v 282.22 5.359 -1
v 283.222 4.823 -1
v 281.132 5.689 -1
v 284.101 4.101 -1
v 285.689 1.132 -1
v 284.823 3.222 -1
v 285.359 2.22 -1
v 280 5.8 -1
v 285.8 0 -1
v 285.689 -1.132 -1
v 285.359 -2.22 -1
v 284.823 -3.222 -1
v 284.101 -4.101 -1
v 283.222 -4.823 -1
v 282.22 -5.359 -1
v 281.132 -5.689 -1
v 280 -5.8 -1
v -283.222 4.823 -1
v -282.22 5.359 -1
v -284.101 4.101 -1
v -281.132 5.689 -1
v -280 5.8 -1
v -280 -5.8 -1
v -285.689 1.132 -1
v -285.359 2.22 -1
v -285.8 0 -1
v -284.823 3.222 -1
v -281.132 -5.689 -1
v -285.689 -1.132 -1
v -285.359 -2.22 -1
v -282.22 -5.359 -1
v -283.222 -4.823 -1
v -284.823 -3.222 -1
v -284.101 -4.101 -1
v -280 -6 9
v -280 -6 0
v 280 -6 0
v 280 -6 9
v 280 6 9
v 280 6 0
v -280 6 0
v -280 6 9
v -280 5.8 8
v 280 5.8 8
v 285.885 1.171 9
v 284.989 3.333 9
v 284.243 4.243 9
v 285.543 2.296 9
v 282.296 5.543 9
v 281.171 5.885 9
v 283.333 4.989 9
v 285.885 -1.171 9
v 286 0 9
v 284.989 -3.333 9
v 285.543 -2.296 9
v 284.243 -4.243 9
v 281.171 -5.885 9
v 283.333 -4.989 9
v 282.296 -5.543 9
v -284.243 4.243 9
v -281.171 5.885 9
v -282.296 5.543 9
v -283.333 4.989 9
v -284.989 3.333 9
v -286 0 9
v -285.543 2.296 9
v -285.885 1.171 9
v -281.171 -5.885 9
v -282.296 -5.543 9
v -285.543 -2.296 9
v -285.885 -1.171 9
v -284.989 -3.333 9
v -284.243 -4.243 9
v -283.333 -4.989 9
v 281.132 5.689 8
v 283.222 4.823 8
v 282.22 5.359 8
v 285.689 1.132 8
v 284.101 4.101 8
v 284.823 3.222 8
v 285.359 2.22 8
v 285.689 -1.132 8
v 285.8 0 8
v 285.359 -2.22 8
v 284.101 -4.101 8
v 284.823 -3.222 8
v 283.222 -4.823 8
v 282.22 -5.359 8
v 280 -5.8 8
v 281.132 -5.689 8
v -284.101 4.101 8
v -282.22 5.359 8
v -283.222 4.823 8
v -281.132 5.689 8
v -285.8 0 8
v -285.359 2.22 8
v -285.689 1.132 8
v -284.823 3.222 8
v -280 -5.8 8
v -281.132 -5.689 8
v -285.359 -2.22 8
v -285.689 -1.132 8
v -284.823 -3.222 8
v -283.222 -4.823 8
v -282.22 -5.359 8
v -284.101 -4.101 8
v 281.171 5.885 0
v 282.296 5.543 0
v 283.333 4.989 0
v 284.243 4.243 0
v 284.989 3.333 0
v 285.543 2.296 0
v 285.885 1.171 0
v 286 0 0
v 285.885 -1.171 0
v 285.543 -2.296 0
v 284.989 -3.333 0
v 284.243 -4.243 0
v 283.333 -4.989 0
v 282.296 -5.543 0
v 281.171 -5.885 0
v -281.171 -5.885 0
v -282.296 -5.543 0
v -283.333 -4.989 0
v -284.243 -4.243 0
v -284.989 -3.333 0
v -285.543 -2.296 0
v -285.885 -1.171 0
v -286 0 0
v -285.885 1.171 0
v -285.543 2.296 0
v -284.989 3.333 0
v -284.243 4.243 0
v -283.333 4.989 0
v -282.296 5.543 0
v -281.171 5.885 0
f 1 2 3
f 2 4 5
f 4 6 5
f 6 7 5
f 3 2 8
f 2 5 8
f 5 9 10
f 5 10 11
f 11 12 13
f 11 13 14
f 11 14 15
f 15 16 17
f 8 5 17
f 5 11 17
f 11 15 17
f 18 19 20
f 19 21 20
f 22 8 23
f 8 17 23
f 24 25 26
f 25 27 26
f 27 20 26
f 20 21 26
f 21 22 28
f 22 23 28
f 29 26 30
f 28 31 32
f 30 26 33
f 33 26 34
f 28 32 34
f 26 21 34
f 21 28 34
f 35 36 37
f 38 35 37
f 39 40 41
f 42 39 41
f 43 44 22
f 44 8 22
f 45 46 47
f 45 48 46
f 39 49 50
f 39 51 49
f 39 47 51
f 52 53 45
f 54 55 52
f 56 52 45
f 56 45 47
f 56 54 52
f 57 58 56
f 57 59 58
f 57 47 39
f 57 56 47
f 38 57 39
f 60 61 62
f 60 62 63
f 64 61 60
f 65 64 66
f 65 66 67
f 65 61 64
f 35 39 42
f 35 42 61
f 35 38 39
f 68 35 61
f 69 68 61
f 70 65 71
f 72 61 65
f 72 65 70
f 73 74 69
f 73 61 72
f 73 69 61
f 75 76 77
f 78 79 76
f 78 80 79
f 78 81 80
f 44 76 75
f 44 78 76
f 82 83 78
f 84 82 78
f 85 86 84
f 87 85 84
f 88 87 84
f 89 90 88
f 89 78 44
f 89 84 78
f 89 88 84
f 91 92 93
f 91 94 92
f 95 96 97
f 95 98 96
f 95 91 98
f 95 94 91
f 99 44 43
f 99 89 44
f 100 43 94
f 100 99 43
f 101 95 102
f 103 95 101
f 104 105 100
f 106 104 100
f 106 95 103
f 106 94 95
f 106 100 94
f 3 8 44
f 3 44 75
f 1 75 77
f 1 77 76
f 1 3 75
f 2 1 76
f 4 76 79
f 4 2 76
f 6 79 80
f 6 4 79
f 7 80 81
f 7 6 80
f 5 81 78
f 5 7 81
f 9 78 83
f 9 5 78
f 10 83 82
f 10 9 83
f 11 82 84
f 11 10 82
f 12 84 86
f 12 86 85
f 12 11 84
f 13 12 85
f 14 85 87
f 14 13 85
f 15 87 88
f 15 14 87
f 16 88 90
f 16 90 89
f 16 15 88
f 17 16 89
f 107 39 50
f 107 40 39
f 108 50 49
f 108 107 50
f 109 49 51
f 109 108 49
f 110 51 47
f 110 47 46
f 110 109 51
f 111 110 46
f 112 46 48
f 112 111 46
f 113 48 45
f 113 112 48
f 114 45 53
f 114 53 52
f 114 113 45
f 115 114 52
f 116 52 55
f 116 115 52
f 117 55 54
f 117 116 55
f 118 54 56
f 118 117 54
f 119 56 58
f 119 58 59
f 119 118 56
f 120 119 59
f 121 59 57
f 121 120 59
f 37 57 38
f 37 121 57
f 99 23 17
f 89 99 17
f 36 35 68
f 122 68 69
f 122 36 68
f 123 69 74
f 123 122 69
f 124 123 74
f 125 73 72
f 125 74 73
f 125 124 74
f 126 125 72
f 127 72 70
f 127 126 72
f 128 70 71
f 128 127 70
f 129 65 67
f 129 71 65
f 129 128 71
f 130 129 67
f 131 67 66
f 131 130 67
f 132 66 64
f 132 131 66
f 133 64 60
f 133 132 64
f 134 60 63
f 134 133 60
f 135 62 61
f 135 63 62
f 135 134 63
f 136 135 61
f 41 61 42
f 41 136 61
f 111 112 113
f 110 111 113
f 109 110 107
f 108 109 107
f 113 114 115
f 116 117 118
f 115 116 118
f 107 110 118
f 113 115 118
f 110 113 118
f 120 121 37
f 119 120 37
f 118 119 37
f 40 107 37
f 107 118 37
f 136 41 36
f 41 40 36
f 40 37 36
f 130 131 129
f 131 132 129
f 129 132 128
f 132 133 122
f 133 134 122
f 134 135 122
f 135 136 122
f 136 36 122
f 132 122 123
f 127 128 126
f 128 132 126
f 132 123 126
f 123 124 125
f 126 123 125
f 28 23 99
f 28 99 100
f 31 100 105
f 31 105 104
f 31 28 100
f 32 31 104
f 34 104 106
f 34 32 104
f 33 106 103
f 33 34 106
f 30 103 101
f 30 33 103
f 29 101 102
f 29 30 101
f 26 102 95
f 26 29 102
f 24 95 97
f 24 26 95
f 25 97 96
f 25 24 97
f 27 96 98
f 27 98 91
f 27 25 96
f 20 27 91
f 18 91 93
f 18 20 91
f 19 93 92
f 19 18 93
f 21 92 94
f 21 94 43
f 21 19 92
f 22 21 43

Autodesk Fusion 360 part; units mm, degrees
sketch "Connection Patch" plane through (0, 0, 0) normal (0, 0, 1) x (-1, 0, 0)
  line L0 (-300, 9) -> (300, 9)
  line L1 (300, 9) -> (300, -9)
  line L2 (300, -9) -> (-300, -9)
  line L3 (-300, -9) -> (-300, 9)
  line L4 (-300, 9) -> (300, -9) construction
  line L5 (300, 9) -> (-300, -9) construction
  dimension "d3" = 600
  dimension "d4" = 18
sketch "Dado Profile" plane through (0, 0, 0) normal (0, 0, 1) x (-1, 0, 0)
  line L0 (-280, -6) -> (280, -6)
  arc A0 (280, -6) -> (280, 6) centre (280, 0) ccw
  line L1 (280, 6) -> (-280, 6)
  arc A1 (-280, 6) -> (-280, -6) centre (-280, 0) ccw
  line L2 (-280, 0) -> (280, 0) construction
  line L3 (-300, 0) -> (300, 0)
  line L4 (300, -9) -> (-300, -9) construction
  line L5 (-300, -9) -> (-300, 9) construction
  line L6 (300, 9) -> (300, -9) construction
  point P0 (300, 0)
  point P1 (-300, 0)
  dimension "d25" = 3
  dimension "d26" = 20
  dimension "d27" = 20
extrude "Extrude1" add sketch "Dado Profile" along normal blind 9 makes body 1
sketch "Sketch3" plane through (0, 0, 0) normal (0, 0, 1) x (-1, 0, 0)
  arc A0 (-280, 6) -> (-280, -6) centre (-280, 0) ccw
  line L0 (-280, -6) -> (280, -6)
  arc A1 (280, -6) -> (280, 6) centre (280, 0) ccw
  line L1 (280, 6) -> (-280, 6)
  line L2 (280, 5.8) -> (-280, 5.8)
  arc A2 (-280, 5.8) -> (-280, -5.8) centre (-280, 0) ccw
  line L3 (-280, -5.8) -> (280, -5.8)
  arc A3 (280, -5.8) -> (280, 5.8) centre (280, 0) ccw
extrude "Extrude2" add sketch "Sketch3" along normal up to surface (9 mm away) separate body contours L2 A2 L3 A3 makes body 2
move_face "OffsetFaces3" offset -1 1 faces at (-93.3333, 1.9333, 9) on bodies 2
move_face "OffsetFaces4" offset 1 1 faces at (-93.3333, 1.9333, 0) on bodies 2
equation "Length = 600 mm"
equation "Width = 18 mm"
equation "d3 = Length"
equation "d4 = Width"
equation "UserOffset1 = 20 mm"
equation "UserOffset2 = 20 mm"
equation "Offset1 = if(UserOffset1 < 5 mm; 5 mm; UserOffset1)"
equation "Offset2 = if(UserOffset2 < 5 mm; 5 mm; UserOffset2)"
equation "OffsetFromTopBottom = 3 mm"
equation "NestledBoardT = 18 mm"
equation "d14 = NestledBoardT / 2"
equation "GapBetweenMortiseandTenon = 0.2 mm"
equation "GapFromBottom = 1 mm"
equation "d23 = -GapFromBottom"
equation "d25 = OffsetFromTopBottom"
equation "d26 = Offset2"
equation "d27 = Offset1"
equation "d28 = -GapBetweenMortiseandTenon"
